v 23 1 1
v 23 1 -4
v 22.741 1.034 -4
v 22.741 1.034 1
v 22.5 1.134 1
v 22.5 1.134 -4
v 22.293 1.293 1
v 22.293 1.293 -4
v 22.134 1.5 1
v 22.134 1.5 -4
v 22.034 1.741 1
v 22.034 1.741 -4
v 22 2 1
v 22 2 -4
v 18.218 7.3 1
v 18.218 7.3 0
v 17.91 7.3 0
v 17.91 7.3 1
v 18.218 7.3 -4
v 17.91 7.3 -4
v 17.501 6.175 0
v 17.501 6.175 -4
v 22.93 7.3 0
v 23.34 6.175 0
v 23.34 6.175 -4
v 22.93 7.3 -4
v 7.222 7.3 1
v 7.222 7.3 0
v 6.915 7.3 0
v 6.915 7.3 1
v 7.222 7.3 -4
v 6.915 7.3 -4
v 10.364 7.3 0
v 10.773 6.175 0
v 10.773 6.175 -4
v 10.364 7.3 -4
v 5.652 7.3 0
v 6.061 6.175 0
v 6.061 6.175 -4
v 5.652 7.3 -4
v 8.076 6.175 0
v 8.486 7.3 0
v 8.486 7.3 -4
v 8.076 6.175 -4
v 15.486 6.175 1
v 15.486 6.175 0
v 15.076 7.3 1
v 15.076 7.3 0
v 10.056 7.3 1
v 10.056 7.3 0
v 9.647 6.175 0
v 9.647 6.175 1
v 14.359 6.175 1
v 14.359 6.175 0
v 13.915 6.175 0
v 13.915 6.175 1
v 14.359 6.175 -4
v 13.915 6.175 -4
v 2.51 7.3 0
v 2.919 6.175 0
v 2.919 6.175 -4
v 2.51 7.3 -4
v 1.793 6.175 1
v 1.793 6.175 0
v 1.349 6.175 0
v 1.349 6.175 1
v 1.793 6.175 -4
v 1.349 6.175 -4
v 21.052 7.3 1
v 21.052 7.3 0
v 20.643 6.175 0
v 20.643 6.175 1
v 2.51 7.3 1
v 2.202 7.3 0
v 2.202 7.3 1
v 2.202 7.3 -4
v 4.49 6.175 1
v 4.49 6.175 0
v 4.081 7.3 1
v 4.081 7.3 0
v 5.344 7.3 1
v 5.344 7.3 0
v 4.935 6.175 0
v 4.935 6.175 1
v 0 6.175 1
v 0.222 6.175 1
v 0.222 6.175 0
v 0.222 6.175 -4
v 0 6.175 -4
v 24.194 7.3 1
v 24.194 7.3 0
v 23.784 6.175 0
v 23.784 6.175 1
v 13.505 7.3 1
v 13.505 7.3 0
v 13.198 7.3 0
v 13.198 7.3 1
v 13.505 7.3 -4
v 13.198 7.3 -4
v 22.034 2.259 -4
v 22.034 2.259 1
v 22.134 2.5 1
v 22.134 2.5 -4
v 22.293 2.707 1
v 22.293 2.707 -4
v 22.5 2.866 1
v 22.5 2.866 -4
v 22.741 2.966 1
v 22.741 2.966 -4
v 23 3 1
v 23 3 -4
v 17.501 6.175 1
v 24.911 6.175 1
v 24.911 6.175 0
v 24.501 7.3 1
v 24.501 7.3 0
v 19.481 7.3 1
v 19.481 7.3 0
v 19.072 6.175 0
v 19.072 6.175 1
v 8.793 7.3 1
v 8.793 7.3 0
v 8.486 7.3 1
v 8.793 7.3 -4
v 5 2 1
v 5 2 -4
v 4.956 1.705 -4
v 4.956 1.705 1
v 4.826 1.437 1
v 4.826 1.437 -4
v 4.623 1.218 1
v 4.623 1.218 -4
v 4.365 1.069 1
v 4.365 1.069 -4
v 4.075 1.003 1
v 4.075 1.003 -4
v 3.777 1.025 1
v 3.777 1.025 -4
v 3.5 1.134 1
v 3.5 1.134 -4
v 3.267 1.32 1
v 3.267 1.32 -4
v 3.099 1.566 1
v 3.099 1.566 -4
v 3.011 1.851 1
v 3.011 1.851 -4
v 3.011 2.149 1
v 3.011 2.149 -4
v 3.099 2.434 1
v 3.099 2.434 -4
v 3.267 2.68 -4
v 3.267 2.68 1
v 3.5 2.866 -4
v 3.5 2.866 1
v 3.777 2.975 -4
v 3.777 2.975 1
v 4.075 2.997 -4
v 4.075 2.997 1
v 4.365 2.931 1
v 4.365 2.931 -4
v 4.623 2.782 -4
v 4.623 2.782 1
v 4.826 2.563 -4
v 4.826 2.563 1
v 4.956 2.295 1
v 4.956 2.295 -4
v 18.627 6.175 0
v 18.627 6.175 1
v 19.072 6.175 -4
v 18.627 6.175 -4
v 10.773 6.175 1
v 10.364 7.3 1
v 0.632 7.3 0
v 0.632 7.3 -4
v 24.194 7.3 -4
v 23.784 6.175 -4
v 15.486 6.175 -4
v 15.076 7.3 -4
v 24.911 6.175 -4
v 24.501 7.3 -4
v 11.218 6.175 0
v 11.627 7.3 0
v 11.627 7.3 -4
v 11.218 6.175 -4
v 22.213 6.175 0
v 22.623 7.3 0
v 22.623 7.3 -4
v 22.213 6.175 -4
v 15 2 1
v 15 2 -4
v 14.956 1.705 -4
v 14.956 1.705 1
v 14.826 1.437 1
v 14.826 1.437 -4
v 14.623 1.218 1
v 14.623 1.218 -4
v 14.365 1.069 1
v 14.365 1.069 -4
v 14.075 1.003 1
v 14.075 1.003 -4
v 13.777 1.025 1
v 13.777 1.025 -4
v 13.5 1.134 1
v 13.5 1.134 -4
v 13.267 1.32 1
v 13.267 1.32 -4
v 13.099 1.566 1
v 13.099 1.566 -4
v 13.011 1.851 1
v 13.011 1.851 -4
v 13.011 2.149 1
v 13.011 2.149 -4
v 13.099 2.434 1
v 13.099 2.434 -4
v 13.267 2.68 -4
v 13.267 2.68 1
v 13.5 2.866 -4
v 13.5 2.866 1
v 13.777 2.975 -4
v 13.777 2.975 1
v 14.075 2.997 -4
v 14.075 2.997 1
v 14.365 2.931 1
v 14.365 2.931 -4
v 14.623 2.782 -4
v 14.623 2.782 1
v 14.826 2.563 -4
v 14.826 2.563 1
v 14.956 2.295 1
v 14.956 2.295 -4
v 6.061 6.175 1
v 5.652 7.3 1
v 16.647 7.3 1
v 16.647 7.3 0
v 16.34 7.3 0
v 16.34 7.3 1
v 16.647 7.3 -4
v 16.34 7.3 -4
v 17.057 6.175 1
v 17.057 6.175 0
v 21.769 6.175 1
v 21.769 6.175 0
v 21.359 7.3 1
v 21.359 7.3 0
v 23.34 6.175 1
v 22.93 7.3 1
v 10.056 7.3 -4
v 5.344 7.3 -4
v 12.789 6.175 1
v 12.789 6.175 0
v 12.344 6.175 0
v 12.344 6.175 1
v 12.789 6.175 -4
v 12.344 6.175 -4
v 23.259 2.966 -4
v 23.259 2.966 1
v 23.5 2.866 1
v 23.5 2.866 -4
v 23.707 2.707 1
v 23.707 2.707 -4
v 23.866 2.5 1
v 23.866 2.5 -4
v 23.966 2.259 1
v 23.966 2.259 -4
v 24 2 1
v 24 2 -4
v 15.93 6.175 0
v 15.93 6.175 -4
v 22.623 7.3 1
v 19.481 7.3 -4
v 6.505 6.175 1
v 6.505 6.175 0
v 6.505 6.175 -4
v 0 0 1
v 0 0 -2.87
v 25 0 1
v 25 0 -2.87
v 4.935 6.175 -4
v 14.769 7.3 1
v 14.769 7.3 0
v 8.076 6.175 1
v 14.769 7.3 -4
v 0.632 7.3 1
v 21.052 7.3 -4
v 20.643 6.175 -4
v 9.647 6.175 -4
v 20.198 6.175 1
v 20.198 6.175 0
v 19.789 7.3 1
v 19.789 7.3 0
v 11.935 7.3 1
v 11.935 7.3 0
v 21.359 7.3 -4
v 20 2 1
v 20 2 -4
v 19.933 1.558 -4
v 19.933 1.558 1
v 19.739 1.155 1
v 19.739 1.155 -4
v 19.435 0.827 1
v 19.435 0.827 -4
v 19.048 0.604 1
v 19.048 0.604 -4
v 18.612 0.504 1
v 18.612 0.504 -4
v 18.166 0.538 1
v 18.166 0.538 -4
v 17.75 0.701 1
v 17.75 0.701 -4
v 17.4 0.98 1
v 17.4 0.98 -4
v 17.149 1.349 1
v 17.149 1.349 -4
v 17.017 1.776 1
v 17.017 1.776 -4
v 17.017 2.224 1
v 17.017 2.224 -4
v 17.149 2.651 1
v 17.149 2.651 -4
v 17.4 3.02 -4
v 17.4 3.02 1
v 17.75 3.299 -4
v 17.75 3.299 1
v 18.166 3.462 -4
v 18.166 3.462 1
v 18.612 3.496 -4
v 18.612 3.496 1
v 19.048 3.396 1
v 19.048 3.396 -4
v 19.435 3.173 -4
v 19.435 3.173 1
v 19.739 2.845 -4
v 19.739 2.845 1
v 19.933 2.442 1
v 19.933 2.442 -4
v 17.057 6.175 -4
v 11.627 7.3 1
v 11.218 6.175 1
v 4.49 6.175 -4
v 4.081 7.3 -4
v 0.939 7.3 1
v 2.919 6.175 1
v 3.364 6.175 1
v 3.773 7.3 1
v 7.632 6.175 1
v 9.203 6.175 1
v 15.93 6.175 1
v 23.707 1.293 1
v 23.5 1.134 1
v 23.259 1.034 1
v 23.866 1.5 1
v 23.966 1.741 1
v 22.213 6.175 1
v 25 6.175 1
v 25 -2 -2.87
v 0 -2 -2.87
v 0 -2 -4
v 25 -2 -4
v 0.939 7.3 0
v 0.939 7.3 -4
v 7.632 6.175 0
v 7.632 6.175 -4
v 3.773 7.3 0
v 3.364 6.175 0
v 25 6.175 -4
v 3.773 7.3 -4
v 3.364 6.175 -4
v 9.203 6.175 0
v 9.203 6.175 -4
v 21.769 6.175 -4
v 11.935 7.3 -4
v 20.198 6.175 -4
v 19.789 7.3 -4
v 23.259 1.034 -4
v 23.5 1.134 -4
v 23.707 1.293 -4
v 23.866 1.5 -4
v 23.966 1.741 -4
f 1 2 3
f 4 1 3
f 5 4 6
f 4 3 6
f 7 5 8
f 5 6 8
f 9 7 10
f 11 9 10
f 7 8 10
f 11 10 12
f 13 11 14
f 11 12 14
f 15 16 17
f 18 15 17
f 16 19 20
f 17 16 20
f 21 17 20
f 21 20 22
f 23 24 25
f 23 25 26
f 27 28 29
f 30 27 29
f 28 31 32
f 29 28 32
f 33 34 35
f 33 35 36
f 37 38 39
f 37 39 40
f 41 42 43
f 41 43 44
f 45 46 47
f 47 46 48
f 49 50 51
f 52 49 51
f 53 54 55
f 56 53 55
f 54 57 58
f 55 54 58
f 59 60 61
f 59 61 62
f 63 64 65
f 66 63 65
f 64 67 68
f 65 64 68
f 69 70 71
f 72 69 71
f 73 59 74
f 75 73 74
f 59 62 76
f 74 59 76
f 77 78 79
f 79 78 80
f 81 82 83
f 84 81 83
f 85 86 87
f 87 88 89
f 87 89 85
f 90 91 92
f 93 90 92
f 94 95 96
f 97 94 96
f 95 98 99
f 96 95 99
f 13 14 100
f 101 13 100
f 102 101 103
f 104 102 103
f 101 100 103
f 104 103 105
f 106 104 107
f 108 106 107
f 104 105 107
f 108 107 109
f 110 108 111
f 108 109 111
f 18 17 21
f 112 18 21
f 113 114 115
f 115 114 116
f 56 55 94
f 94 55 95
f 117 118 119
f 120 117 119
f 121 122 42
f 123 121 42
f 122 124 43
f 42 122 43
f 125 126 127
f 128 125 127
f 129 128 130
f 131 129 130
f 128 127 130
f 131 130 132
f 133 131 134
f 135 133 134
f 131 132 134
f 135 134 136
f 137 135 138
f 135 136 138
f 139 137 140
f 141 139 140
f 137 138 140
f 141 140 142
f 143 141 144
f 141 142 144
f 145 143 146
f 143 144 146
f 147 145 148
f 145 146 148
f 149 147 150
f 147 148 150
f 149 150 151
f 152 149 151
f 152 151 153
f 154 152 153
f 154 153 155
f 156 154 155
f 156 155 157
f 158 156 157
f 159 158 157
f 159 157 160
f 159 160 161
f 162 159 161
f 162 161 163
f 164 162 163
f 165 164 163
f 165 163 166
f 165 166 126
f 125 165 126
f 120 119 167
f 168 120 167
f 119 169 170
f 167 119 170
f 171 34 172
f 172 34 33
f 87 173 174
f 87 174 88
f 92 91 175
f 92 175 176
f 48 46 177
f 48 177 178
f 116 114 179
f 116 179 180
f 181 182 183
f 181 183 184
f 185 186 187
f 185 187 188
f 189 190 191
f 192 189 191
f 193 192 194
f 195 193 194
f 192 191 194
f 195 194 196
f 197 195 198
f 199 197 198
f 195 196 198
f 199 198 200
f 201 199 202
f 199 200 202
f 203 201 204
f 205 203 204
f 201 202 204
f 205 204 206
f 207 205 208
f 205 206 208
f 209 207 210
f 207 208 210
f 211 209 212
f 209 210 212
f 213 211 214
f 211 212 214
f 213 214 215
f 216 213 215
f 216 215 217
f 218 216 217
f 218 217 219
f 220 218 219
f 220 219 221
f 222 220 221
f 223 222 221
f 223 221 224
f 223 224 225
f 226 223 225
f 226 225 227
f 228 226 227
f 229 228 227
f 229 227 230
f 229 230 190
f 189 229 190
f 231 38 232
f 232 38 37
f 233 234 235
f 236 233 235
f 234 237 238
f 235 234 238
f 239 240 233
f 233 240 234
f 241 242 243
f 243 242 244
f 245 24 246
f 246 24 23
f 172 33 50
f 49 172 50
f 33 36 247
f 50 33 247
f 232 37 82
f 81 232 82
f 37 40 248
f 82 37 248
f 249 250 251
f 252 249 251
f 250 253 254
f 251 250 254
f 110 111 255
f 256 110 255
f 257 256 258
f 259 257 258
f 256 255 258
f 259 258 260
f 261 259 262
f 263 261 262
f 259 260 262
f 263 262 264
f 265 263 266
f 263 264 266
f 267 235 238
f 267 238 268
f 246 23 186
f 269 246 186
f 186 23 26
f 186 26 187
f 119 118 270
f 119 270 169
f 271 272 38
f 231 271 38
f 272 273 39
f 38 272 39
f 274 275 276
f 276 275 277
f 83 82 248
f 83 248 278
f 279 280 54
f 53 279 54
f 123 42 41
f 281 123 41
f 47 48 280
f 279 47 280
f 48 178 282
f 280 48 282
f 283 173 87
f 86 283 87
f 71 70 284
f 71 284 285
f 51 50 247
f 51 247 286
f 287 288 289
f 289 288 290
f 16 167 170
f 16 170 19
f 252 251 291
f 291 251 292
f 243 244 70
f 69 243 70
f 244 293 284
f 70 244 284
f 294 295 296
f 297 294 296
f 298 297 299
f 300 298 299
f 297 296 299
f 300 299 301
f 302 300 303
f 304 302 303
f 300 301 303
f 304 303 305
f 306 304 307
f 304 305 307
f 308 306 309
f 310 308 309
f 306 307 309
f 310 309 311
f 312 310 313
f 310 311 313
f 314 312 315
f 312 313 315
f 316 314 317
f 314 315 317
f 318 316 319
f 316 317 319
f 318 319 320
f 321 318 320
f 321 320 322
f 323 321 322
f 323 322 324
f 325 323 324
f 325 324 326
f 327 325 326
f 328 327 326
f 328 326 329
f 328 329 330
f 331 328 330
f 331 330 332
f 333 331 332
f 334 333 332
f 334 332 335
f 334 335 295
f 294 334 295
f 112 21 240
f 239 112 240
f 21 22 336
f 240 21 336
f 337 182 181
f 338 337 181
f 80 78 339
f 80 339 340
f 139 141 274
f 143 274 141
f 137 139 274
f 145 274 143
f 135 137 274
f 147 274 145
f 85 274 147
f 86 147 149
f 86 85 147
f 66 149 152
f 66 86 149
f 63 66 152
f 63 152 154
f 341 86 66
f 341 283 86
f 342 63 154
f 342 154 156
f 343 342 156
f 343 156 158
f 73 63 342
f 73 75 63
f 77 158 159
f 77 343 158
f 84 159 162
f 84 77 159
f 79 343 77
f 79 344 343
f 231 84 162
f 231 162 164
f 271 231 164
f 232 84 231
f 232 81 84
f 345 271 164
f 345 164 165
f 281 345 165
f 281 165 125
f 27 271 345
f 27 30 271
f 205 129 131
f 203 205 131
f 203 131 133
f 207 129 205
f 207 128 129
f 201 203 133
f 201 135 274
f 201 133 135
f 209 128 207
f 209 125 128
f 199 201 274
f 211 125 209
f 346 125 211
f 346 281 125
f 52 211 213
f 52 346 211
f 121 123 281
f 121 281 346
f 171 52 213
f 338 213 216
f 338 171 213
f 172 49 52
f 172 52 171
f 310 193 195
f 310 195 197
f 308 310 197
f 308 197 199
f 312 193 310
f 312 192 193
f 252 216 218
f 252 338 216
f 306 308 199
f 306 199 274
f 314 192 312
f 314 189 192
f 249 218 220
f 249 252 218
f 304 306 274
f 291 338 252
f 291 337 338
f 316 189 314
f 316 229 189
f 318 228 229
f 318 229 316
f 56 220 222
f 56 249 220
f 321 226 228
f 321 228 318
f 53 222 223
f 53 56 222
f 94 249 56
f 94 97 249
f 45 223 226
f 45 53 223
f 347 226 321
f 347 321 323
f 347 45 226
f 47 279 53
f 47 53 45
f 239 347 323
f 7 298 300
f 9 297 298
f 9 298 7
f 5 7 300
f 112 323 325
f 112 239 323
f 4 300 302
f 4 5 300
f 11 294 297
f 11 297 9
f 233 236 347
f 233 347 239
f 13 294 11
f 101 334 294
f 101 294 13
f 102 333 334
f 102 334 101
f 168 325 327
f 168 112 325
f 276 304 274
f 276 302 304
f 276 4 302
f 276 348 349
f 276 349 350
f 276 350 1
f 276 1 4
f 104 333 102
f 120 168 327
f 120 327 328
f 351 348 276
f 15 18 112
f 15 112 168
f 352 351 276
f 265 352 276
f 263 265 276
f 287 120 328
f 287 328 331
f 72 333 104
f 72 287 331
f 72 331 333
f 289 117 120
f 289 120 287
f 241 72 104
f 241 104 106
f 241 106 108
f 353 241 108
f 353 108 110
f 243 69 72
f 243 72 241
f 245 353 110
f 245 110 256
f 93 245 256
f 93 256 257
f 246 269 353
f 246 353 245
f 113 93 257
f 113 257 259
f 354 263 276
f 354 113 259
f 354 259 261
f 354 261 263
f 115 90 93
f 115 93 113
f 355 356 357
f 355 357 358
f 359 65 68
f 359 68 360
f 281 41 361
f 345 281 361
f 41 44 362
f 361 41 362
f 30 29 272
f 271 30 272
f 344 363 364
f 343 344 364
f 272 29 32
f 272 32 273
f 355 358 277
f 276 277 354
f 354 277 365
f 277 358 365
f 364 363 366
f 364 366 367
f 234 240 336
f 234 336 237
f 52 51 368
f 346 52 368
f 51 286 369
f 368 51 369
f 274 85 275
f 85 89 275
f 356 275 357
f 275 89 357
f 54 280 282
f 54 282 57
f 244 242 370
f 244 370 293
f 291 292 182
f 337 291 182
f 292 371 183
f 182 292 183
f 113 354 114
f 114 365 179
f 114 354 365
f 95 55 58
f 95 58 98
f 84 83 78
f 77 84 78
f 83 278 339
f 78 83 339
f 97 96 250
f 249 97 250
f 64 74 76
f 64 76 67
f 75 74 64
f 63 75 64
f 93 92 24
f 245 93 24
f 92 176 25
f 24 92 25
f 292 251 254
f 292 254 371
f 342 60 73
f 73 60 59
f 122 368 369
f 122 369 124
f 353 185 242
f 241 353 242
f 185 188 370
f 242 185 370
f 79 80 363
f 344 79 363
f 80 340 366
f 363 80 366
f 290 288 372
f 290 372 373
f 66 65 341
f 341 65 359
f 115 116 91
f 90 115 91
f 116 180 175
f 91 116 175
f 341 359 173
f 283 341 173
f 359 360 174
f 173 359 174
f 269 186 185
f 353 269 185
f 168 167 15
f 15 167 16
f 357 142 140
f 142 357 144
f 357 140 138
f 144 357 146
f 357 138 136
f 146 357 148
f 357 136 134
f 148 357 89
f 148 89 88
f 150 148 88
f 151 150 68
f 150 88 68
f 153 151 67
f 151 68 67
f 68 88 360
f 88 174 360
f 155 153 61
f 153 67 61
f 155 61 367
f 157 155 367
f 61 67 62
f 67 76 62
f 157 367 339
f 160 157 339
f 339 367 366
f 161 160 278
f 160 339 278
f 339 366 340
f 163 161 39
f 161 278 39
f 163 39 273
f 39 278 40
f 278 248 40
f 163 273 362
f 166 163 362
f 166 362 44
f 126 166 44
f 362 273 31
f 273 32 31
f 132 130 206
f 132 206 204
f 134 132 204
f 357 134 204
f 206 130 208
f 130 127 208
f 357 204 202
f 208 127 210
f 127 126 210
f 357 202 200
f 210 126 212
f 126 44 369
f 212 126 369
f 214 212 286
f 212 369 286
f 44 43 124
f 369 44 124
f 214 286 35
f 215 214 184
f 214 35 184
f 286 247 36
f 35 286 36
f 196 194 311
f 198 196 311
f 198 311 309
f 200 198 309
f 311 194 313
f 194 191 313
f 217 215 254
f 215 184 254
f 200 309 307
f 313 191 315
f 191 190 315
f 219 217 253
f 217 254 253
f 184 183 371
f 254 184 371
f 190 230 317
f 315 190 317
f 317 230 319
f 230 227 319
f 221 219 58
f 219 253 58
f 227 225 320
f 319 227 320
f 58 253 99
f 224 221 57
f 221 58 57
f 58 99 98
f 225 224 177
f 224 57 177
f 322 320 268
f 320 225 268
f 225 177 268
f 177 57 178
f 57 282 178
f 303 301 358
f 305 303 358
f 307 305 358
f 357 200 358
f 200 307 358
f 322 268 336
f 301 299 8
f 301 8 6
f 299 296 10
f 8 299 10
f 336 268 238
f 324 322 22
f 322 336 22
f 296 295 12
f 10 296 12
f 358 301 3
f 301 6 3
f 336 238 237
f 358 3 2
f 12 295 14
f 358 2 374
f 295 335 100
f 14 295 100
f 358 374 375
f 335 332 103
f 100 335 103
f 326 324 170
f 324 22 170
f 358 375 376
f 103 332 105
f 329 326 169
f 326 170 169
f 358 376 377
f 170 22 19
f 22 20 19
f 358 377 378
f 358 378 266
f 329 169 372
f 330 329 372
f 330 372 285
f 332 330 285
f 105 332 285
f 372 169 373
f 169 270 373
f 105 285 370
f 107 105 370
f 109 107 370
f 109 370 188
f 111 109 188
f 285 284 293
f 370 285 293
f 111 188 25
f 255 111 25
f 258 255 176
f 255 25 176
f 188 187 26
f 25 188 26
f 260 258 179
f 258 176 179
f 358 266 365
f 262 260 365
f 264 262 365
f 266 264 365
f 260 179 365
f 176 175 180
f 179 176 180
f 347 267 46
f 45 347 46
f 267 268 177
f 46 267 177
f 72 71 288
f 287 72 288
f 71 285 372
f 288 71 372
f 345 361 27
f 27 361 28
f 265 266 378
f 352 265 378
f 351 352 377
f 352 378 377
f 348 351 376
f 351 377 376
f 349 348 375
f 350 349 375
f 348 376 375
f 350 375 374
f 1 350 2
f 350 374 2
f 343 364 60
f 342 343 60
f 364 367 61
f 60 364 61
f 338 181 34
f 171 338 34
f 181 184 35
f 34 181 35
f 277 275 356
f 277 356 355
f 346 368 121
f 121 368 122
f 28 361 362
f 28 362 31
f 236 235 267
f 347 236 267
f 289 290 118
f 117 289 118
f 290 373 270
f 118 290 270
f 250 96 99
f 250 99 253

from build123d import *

# Parameters (mm, degrees)
BLANKSKE_W          = 25
BLANKSKE_H          = 7.3
BLANK_DEPTH         = 4
TOOTHCUTSIM_DEPTH   = 27.349383294
TEETHCUTS_COUNT     = 17
TEETHCUTS_PITCH     = 1.570796325
SKETCH4_W           = 25
SKETCH4_H           = 1.13
BOSS_EXTRUDE1_DEPTH = 2
BOSS_EXTRUDE2_DEPTH = 1
CUT_EXTRUDE1_DEPTH  = 27.519615382


with BuildPart() as part:
    # BlankSke → Blank (new body)
    with BuildSketch(Plane.XY):
        with Locations((12.5, 3.65)):
            Rectangle(BLANKSKE_W, BLANKSKE_H)
    extrude(amount=-BLANK_DEPTH)

    # TooCutSkeSim → ToothCutSim (cut, through all)
    with BuildSketch(Plane.XY):
        Polygon((0.222217685, 6.175), (-0.222217685, 6.175), (-0.640929042, 7.3254), (0.640929042, 7.3254), align=None)
    toothcutsim = extrude(amount=-TOOTHCUTSIM_DEPTH, mode=Mode.SUBTRACT)

    # TeethCuts: ToothCutSim ×17
    with Locations(*[(i * TEETHCUTS_PITCH, 0, 0) for i in range(1, TEETHCUTS_COUNT)]):
        add(toothcutsim, mode=Mode.SUBTRACT)

    # Sketch4 → Boss-Extrude1 (add)
    with BuildSketch(Plane.XZ):
        with Locations((12.5, -3.435)):
            Rectangle(SKETCH4_W, SKETCH4_H)
    extrude(amount=BOSS_EXTRUDE1_DEPTH)

    # Sketch7 → Boss-Extrude2 (add)
    with BuildSketch(Plane.XY):
        Polygon((25, 6.175), (24.910523515, 6.175), (24.501057002, 7.3), (24.193629073, 7.3), (23.78416256, 6.175), (23.33972719, 6.175), (22.930260677, 7.3), (22.622832748, 7.3), (22.213366235, 6.175), (21.768930865, 6.175), (21.359464352, 7.3), (21.052036423, 7.3), (20.64256991, 6.175), (20.19813454, 6.175), (19.788668027, 7.3), (19.481240098, 7.3), (19.071773585, 6.175), (18.627338215, 6.175), (18.217871702, 7.3), (17.910443773, 7.3), (17.50097726, 6.175), (17.05654189, 6.175), (16.647075377, 7.3), (16.339647448, 7.3), (15.930180935, 6.175), (15.485745565, 6.175), (15.076279052, 7.3), (14.768851123, 7.3), (14.35938461, 6.175), (13.91494924, 6.175), (13.505482727, 7.3), (13.198054798, 7.3), (12.788588285, 6.175), (12.344152915, 6.175), (11.934686402, 7.3), (11.627258473, 7.3), (11.21779196, 6.175), (10.77335659, 6.175), (10.363890077, 7.3), (10.056462148, 7.3), (9.646995635, 6.175), (9.202560265, 6.175), (8.793093752, 7.3), (8.485665823, 7.3), (8.07619931, 6.175), (7.63176394, 6.175), (7.222297427, 7.3), (6.914869498, 7.3), (6.505402985, 6.175), (6.060967615, 6.175), (5.651501102, 7.3), (5.344073173, 7.3), (4.93460666, 6.175), (4.49017129, 6.175), (4.080704777, 7.3), (3.773276848, 7.3), (3.363810335, 6.175), (2.919374965, 6.175), (2.509908452, 7.3), (2.202480523, 7.3), (1.79301401, 6.175), (1.34857864, 6.175), (0.939112127, 7.3), (0.631684198, 7.3), (0.222217685, 6.175), (0, 6.175), (0, 0), (25, 0), align=None)
    extrude(amount=BOSS_EXTRUDE2_DEPTH)

    # Sketch1 → Cut-Extrude1 (cut, through all)
    with BuildSketch(Plane(origin=(0, 0, -4), x_dir=(-1, 0, 0), z_dir=(0, 0, -1))):
        with BuildLine():
            Line((-23, 1), (-23, 2))
            Line((-23, 2), (-24, 2))
            ThreePointArc((-24, 2), (-23.707106781, 1.292893219), (-23, 1))
        make_face()
        with BuildLine():
            Line((-24, 2), (-23, 2))
            Line((-23, 2), (-23, 3))
            ThreePointArc((-23, 3), (-23.707106781, 2.707106781), (-24, 2))
        make_face()
        with BuildLine():
            Line((-23, 3), (-23, 2))
            Line((-23, 2), (-23, 1))
            ThreePointArc((-23, 1), (-22.292893219, 1.292893219), (-22, 2))
            ThreePointArc((-22, 2), (-22.292893219, 2.707106781), (-23, 3))
        make_face()
        with BuildLine():
            ThreePointArc((-17, 2), (-18.5, 3.5), (-20, 2))
            Line((-20, 2), (-17, 2))
        make_face()
        with BuildLine():
            Line((-17, 2), (-20, 2))
            ThreePointArc((-20, 2), (-18.5, 0.5), (-17, 2))
        make_face()
        with BuildLine():
            ThreePointArc((-13, 2), (-14, 3), (-15, 2))
            Line((-15, 2), (-13, 2))
        make_face()
        with BuildLine():
            Line((-13, 2), (-15, 2))
            ThreePointArc((-15, 2), (-14, 1), (-13, 2))
        make_face()
        with BuildLine():
            ThreePointArc((-3, 2), (-4, 3), (-5, 2))
            Line((-5, 2), (-3, 2))
        make_face()
        with BuildLine():
            Line((-3, 2), (-5, 2))
            ThreePointArc((-5, 2), (-4, 1), (-3, 2))
        make_face()
    extrude(amount=-CUT_EXTRUDE1_DEPTH, mode=Mode.SUBTRACT)


solid = part.part
